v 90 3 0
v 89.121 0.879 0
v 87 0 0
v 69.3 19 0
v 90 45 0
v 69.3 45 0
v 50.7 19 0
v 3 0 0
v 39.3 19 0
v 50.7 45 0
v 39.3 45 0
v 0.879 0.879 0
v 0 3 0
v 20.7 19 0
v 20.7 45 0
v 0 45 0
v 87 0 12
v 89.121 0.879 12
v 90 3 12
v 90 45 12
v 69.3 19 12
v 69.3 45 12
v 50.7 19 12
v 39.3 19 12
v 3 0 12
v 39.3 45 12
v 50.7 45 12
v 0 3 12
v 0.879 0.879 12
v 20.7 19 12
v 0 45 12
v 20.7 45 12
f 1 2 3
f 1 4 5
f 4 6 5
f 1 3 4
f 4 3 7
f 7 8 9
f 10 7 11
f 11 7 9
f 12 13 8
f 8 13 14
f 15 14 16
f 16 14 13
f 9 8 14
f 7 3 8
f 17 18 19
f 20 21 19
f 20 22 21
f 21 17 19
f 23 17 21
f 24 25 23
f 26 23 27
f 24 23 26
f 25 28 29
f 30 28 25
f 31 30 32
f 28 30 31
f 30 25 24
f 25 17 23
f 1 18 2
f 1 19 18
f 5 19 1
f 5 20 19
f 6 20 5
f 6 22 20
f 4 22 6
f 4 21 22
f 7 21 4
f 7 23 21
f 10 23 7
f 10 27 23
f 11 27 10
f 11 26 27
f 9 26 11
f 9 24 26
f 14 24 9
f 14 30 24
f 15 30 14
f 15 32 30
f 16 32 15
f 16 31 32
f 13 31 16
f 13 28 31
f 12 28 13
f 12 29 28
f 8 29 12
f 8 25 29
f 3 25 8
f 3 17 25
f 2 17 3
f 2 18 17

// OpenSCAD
$fn = 32;

// ----------------------------------------------------------------------
// Window plate: 90 x 45 mm, 2 open windows
// ----------------------------------------------------------------------

// --- parameters (mm) ---
profile_height = 12;      // extrusion height
profile_points = 16;      // points of the closed outline

profile = [[0, 3], [0.879, 0.879], [3, 0], [87, 0], [89.121, 0.879], [90, 3], [90, 45], [69.3, 45], [69.3, 19], [50.7, 19], [50.7, 45], [39.3, 45], [39.3, 19], [20.7, 19], [20.7, 45], [0, 45]];  // single closed polygon, 16 points, counter clockwise

// --- the one profile operation ---
linear_extrude(height = profile_height) polygon(points = profile);
